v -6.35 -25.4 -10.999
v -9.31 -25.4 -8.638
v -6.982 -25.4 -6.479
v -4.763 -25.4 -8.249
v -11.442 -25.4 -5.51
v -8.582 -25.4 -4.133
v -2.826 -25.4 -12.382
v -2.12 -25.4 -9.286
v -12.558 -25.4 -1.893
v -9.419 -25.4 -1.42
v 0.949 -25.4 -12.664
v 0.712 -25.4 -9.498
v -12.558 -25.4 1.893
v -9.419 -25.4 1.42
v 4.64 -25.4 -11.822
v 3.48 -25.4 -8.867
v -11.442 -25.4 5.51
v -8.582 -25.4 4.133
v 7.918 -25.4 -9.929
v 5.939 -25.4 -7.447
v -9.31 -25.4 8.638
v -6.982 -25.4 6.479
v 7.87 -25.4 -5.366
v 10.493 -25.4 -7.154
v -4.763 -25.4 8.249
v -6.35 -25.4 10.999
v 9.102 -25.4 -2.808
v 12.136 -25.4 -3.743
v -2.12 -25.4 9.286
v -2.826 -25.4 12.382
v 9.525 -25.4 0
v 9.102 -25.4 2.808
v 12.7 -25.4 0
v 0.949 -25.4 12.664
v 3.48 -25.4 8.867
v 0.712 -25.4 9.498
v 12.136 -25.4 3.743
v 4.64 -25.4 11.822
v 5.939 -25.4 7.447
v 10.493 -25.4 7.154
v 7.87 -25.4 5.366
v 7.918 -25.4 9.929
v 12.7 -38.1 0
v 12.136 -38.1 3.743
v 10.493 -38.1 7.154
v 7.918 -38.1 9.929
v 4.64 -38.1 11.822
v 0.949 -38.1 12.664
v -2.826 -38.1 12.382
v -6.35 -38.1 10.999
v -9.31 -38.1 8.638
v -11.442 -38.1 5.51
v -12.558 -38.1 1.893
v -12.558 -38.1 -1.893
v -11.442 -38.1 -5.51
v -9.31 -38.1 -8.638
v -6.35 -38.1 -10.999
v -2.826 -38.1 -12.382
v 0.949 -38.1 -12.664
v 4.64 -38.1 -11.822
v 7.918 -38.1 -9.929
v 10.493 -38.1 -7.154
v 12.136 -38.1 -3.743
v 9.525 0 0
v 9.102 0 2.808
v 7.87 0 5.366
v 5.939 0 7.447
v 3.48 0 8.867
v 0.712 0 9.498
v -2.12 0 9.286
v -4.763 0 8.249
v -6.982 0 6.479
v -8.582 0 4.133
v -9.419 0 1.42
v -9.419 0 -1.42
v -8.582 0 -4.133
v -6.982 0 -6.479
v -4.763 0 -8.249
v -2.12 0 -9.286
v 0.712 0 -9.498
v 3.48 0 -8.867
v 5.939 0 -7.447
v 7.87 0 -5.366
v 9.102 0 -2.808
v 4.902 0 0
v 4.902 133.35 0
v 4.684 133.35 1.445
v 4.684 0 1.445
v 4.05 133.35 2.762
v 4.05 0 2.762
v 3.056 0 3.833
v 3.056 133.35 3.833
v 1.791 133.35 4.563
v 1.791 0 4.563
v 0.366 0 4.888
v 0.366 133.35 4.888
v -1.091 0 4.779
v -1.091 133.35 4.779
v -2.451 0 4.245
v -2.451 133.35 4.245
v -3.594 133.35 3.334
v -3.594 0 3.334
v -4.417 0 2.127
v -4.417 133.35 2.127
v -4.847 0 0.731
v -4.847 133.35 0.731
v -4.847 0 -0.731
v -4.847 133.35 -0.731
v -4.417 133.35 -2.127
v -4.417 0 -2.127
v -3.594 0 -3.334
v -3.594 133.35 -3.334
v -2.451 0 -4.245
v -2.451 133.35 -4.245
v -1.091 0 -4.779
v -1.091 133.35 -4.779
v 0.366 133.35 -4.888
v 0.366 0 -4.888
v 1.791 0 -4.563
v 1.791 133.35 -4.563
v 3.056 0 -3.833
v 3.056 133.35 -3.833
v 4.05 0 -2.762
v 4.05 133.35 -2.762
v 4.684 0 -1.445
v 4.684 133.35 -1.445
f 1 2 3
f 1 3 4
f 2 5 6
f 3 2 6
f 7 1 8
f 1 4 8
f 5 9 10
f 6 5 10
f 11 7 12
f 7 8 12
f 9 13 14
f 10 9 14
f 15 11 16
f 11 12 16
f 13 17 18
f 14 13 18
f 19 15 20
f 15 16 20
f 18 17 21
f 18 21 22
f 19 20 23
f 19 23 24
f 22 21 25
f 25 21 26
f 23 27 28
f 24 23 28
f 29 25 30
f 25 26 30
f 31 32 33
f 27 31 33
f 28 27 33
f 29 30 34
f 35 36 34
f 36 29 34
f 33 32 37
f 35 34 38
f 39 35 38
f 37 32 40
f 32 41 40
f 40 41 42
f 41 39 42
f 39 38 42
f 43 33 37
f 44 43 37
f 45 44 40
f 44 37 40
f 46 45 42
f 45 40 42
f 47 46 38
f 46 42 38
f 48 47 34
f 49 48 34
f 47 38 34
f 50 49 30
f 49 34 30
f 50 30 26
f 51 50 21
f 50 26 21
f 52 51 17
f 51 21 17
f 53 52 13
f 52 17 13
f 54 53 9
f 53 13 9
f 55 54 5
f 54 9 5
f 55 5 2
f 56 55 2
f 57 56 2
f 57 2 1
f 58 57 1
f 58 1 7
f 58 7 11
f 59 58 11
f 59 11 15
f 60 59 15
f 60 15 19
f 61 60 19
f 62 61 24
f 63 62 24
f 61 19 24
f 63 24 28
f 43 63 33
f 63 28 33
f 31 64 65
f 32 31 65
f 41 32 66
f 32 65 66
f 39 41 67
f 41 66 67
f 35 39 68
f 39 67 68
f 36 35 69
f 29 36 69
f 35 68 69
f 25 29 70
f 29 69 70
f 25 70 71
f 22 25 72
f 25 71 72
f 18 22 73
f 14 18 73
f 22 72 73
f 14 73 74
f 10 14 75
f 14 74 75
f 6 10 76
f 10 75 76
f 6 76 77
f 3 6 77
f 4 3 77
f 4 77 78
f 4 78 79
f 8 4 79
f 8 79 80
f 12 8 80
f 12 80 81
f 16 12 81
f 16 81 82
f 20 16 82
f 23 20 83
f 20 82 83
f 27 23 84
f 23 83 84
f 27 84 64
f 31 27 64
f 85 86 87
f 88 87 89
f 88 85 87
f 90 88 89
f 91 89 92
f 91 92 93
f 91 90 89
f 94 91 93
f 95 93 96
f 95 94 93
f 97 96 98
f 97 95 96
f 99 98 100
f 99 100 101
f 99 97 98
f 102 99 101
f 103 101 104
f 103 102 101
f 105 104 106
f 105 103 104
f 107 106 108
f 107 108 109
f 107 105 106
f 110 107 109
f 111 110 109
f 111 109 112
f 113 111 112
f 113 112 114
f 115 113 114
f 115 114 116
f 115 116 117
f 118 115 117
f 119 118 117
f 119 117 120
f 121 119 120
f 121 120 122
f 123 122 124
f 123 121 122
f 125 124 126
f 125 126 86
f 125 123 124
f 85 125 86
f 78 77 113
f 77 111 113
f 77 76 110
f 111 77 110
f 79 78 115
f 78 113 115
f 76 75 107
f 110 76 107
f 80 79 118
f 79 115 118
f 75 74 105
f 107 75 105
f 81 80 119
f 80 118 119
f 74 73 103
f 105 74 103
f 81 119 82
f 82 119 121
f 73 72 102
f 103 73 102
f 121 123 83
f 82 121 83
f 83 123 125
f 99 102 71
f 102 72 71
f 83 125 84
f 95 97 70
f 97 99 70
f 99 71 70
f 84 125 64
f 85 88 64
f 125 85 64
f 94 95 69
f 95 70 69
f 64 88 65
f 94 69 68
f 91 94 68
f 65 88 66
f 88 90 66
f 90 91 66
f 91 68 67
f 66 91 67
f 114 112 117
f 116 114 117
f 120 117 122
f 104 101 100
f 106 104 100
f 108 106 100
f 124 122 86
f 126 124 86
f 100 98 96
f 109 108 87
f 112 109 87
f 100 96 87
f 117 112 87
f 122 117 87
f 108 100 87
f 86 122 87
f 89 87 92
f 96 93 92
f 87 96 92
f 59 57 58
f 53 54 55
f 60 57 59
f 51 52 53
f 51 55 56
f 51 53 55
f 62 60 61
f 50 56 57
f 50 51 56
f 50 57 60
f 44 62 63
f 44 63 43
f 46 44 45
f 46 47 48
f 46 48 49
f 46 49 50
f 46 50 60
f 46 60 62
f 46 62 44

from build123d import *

# Parameters (mm, degrees)
F0_R     = 4.9022
F1_DEPTH = 133.35
F2_R     = 9.525
F3_DEPTH = 25.4
F4_R     = 12.7
F5_DEPTH = 12.7


with BuildPart() as f1:
    # F0 (on Front) → F1 (new body)
    with BuildSketch(Plane.XZ):
        Circle(F0_R)
    extrude(amount=-F1_DEPTH)

    # F2 (on Front) → F3 (join)
    with BuildSketch(Plane.XZ):
        Circle(F2_R)
    extrude(amount=F3_DEPTH)

    # F4 (on face) → F5 (join)
    with BuildSketch(Plane.XZ.offset(25.4)):
        Circle(F4_R)
    extrude(amount=F5_DEPTH)


solid = f1.part
